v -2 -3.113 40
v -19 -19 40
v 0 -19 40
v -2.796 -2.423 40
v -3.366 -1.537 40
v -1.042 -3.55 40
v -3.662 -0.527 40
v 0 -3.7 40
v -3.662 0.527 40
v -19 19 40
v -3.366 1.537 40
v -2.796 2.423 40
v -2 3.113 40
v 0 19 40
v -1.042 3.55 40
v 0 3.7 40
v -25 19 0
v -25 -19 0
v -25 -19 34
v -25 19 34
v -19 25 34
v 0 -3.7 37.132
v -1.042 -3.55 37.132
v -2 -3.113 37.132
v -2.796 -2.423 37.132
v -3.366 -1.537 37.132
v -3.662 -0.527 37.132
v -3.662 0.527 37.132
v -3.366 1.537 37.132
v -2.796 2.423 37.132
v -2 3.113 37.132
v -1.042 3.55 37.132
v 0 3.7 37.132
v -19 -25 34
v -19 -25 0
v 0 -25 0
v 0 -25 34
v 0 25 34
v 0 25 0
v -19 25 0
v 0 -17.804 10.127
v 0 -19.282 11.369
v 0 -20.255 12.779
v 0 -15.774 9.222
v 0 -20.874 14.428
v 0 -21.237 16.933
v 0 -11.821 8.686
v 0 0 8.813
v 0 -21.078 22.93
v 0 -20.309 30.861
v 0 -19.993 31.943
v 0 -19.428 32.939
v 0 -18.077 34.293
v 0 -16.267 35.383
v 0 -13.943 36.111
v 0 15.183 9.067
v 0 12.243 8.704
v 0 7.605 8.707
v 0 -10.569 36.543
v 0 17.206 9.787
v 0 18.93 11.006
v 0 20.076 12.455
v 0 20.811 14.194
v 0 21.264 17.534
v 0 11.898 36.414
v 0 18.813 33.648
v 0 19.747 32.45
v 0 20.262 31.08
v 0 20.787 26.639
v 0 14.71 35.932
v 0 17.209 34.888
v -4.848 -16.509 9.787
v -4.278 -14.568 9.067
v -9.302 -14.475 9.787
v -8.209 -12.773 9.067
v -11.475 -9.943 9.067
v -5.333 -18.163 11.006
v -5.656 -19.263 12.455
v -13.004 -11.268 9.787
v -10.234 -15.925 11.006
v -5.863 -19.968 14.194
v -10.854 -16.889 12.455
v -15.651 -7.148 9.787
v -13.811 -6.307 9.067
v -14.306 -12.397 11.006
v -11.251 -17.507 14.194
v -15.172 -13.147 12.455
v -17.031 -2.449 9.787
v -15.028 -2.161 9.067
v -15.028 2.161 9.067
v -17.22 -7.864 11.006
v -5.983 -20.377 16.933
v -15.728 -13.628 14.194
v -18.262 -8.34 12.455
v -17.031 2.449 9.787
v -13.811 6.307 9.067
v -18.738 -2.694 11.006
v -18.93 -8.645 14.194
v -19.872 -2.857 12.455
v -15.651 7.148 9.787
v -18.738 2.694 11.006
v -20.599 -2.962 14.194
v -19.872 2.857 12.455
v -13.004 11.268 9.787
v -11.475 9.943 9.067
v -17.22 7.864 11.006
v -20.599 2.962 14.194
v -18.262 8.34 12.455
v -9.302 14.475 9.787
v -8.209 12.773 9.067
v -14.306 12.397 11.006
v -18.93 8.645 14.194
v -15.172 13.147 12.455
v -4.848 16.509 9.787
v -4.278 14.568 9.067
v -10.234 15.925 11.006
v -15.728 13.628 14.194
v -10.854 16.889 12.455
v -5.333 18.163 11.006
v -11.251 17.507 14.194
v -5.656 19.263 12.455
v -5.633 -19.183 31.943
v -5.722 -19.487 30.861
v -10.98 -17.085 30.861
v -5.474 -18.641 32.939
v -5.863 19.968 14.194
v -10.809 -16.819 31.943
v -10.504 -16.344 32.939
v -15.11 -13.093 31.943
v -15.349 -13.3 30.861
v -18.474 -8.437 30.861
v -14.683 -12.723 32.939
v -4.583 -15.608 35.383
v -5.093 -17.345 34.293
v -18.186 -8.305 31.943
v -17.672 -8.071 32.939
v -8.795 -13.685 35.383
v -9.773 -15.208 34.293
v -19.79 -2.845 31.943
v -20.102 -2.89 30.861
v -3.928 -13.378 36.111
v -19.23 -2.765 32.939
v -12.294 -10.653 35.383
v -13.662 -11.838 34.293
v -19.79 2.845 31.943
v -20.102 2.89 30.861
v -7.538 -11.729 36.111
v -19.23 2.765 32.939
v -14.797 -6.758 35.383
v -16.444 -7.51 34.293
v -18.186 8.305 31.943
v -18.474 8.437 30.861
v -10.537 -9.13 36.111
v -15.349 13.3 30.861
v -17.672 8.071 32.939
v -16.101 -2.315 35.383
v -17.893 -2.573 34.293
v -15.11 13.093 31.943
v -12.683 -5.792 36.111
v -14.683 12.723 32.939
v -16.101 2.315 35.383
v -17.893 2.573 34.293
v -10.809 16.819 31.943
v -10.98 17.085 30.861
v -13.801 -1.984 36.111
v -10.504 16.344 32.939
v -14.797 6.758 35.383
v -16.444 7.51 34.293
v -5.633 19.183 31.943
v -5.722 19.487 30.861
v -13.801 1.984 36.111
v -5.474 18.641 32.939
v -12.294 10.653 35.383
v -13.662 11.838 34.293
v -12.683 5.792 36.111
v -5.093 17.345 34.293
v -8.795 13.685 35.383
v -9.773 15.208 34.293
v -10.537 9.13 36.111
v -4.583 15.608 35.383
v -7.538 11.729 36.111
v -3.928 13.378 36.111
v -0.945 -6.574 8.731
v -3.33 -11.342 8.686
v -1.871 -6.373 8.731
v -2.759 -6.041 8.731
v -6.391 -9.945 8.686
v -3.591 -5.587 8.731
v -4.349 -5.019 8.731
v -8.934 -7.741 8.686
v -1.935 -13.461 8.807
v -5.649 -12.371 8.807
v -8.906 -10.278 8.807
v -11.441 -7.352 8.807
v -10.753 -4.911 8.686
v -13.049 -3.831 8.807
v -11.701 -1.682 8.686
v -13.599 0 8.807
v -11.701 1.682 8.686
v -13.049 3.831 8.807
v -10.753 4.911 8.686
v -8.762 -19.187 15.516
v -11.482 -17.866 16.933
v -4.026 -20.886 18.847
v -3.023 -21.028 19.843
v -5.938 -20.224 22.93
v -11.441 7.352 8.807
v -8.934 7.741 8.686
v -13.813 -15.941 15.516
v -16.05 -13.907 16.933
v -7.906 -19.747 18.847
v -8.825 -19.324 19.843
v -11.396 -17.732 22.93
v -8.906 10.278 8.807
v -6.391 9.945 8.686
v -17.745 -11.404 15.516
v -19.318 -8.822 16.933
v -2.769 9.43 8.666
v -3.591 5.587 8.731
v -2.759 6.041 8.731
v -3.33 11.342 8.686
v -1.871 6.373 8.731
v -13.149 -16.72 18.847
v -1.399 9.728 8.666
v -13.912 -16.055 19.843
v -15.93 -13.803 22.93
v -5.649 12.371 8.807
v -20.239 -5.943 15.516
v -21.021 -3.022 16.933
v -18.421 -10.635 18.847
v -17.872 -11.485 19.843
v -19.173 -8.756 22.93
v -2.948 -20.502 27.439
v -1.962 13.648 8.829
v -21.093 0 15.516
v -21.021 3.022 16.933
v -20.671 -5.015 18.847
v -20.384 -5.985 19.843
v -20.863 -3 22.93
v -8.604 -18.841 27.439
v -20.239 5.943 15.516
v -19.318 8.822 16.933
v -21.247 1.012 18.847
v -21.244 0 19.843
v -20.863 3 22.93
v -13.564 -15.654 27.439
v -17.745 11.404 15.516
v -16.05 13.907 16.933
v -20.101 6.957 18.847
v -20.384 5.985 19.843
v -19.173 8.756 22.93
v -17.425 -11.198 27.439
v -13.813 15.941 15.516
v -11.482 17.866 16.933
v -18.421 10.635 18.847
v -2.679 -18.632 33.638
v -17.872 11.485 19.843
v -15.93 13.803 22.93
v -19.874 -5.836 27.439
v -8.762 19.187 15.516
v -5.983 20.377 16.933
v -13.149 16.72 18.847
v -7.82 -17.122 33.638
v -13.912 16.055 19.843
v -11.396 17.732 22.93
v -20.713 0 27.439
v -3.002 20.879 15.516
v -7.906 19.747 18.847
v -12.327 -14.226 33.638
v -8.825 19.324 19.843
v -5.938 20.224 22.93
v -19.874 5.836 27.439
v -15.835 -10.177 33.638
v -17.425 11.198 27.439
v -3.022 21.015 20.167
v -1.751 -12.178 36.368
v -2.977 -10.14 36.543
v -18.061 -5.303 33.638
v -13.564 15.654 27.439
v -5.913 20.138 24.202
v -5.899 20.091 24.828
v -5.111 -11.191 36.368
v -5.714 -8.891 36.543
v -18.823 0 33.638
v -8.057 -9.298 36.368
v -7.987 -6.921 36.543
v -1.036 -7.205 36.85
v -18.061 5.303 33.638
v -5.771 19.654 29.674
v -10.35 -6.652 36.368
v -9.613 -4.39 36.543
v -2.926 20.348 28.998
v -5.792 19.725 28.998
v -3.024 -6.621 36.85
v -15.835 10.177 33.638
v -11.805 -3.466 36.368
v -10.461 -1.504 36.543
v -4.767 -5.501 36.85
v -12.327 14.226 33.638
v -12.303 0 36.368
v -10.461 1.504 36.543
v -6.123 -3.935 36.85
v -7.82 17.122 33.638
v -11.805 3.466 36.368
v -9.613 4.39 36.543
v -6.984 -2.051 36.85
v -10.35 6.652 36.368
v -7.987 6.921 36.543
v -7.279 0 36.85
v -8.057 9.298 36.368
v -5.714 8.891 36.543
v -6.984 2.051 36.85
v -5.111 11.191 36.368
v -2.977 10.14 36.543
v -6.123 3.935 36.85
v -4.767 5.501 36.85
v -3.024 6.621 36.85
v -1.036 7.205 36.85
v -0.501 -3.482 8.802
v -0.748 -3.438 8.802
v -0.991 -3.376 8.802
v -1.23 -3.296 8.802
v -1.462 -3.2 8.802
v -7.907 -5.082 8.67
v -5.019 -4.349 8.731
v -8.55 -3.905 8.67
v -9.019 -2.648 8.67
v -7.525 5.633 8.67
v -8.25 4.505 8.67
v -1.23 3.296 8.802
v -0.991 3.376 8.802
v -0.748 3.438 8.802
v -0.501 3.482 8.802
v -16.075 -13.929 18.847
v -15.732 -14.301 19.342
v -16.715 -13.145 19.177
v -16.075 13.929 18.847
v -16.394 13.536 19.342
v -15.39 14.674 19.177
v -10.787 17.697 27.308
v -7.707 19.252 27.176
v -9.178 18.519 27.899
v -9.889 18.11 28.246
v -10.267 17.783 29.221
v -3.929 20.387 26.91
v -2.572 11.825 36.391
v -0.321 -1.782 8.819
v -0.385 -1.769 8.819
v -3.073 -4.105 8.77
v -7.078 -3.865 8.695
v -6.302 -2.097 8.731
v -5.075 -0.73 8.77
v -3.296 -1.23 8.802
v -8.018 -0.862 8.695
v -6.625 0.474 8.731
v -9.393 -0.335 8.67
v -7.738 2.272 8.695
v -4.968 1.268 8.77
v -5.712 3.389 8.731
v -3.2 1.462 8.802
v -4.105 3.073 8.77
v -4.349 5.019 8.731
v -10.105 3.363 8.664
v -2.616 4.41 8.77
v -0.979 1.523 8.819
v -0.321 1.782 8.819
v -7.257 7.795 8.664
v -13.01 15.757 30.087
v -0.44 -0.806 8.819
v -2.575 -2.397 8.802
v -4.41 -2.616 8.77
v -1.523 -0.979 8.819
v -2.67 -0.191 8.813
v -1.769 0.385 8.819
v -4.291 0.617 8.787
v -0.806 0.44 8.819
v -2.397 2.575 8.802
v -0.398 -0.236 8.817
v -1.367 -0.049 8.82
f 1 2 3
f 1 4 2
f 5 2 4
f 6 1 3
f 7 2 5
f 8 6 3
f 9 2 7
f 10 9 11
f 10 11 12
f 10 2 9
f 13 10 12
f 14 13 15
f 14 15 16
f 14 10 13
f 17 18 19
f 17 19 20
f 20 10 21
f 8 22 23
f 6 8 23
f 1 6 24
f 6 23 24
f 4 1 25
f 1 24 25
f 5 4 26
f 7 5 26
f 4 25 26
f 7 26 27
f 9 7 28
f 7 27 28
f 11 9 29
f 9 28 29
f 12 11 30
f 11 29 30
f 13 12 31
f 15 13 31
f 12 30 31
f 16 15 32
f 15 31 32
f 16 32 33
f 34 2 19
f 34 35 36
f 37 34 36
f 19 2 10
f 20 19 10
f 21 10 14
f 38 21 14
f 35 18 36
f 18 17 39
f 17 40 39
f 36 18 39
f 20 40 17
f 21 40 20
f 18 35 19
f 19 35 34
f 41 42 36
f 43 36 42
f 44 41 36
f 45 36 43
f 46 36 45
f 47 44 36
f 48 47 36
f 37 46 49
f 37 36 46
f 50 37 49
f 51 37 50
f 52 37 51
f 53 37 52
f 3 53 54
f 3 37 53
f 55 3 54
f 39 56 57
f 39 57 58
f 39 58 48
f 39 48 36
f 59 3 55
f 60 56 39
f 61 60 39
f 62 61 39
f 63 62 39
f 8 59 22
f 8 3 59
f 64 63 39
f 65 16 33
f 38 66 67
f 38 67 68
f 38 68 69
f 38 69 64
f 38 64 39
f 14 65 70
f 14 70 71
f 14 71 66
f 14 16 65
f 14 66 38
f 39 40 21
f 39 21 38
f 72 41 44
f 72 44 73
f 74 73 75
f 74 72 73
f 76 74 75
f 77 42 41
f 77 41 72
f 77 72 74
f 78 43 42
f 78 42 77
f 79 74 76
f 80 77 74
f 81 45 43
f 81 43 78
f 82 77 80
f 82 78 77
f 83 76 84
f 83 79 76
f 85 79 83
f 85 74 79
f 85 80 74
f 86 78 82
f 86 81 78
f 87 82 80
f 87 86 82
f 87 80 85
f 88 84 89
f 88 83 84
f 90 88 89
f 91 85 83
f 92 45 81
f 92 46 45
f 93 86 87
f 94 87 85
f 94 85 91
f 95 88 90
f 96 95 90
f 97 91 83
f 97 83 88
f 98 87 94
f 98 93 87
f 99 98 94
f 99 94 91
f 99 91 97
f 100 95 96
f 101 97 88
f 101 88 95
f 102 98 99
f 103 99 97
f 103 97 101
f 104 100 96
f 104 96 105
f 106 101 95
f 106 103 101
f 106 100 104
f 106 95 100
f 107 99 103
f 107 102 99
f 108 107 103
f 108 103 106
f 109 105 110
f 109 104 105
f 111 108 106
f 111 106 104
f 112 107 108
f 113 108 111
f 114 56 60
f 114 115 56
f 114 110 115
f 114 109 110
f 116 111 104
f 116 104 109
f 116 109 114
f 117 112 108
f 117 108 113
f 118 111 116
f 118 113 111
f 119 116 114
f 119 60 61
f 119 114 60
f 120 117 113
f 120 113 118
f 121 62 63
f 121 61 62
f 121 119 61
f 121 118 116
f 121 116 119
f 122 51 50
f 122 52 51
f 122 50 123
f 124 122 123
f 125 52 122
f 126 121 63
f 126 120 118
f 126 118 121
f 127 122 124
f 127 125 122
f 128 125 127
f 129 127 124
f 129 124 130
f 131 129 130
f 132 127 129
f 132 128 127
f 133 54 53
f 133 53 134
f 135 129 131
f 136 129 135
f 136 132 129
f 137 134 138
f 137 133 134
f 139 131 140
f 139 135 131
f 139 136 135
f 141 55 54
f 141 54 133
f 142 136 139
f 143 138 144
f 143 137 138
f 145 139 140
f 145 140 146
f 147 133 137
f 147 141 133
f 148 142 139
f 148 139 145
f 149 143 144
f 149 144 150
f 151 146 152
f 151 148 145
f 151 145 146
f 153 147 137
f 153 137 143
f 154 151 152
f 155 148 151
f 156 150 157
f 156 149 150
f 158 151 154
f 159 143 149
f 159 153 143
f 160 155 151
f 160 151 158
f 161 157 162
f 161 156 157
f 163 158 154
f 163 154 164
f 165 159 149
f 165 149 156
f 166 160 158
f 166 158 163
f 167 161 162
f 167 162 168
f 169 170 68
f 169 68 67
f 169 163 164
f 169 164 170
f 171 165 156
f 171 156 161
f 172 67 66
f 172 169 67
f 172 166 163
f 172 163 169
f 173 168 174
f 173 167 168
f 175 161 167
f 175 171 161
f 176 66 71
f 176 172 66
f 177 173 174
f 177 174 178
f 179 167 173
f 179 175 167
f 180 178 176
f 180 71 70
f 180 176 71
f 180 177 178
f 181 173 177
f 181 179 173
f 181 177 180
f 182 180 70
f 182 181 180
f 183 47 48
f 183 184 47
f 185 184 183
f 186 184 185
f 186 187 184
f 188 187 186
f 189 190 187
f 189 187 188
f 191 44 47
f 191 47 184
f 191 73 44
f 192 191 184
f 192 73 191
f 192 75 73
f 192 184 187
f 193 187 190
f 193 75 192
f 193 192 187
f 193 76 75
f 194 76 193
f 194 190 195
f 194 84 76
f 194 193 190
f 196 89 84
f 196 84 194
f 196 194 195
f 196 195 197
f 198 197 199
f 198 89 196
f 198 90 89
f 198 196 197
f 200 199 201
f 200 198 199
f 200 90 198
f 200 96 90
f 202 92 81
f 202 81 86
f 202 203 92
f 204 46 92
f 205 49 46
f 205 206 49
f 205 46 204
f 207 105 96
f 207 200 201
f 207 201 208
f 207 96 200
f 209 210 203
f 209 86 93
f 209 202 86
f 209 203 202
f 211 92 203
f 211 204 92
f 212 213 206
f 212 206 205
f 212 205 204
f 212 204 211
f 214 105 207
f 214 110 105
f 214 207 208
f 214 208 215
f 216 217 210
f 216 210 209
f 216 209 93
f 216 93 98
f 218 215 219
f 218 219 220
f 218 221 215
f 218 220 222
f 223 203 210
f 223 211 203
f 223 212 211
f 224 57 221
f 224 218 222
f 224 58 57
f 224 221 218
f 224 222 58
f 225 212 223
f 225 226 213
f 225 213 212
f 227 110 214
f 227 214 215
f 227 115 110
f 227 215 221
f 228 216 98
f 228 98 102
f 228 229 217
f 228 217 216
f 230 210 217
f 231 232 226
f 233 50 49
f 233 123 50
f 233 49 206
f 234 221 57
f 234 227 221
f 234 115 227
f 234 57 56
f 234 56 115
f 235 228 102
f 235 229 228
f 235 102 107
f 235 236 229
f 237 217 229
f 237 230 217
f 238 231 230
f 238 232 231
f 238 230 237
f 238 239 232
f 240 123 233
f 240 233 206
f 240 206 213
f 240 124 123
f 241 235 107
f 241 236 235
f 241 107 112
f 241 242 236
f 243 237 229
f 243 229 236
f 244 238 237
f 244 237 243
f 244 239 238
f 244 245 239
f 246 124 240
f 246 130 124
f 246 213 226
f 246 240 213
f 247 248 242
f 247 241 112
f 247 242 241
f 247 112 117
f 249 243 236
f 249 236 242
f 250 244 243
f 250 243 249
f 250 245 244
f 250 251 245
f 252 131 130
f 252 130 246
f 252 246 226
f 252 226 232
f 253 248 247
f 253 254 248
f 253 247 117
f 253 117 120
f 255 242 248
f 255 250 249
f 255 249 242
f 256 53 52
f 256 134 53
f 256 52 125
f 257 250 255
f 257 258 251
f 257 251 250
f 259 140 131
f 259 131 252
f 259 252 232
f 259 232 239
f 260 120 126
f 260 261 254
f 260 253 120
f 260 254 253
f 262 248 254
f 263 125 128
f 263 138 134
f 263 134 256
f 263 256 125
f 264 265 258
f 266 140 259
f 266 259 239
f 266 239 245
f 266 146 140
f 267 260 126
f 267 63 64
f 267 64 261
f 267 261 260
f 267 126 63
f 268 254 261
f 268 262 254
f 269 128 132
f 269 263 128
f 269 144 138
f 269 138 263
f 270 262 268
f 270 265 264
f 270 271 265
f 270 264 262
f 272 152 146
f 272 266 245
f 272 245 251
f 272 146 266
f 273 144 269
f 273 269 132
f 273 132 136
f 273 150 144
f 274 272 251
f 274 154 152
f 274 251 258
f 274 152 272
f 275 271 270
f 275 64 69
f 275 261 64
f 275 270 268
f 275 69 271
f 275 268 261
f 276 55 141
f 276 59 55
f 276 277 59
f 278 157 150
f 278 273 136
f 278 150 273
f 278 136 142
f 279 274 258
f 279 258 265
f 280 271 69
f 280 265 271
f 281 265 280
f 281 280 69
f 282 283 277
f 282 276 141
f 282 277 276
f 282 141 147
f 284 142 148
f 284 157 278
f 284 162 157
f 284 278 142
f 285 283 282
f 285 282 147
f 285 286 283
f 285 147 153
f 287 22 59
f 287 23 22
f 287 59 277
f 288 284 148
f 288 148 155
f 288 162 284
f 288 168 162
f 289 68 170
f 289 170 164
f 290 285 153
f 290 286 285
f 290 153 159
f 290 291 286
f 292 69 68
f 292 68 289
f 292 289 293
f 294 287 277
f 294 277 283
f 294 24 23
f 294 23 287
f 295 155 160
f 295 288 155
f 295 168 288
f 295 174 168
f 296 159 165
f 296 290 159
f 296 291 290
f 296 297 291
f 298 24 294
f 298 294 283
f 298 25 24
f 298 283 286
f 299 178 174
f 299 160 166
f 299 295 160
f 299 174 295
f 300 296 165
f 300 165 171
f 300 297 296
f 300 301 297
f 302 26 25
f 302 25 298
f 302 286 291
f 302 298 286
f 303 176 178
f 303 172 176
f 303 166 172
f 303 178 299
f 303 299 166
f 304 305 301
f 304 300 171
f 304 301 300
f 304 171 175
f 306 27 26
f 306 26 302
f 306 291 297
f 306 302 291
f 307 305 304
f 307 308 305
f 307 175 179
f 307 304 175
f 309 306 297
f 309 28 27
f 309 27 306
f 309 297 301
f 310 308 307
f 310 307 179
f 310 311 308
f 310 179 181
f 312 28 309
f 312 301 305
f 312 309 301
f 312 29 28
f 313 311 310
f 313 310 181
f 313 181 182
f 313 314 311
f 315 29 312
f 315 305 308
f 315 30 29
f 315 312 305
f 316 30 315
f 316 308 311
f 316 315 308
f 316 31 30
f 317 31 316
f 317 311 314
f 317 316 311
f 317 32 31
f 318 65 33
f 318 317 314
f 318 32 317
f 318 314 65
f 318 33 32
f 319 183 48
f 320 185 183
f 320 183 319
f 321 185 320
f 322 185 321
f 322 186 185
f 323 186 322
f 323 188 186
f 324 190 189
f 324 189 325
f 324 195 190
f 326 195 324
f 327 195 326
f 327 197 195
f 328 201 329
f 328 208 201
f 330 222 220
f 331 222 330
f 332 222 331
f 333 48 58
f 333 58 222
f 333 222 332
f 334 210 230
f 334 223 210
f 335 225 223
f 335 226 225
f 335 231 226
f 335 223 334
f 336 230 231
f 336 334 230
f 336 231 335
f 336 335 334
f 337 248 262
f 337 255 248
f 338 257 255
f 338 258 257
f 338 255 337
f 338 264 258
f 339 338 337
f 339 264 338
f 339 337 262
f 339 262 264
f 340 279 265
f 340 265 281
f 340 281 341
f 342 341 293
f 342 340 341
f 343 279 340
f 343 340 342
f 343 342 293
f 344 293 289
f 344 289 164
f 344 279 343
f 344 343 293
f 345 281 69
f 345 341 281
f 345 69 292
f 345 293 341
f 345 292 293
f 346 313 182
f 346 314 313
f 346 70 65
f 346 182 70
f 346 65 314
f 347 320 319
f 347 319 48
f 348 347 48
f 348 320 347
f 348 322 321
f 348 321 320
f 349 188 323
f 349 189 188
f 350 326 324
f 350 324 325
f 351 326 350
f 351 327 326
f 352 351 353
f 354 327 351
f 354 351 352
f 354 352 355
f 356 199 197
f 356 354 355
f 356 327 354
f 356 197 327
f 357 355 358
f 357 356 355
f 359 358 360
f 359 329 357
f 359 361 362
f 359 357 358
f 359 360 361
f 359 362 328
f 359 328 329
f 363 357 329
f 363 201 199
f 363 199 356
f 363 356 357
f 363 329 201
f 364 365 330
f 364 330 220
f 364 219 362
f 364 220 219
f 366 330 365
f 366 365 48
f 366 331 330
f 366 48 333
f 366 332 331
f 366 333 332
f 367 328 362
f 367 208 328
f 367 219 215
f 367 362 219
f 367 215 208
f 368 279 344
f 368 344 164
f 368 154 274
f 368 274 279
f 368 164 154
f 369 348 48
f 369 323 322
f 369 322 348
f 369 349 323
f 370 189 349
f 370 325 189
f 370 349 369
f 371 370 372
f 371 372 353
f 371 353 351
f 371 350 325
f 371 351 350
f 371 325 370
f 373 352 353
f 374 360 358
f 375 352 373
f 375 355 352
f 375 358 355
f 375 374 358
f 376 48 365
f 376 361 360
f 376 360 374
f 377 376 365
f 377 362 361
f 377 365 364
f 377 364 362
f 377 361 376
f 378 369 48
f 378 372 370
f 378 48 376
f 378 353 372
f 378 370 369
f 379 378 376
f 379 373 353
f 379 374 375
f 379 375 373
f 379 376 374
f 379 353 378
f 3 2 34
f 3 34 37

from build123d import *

# Parameters (mm, degrees)
F0_W     = 50
F0_H     = 50
F1_DEPTH = 40
F2_SIZE  = 6
F3_W     = 83.7730430067
F3_H     = 50.7384873927
F4_DEPTH = 25


with BuildPart() as f1:
    # F0 (on Top) → F1 (new body)
    with BuildSketch(Plane.XY):
        Rectangle(F0_W, F0_H)
    extrude(amount=F1_DEPTH)

    # F2
    f2_edges = [f1.edges().sort_by_distance(p)[0] for p in [
        (0, -25, 40),
        (25, 0, 40),
        (0, 25, 40),
        (-25, 0, 40),
        (25, -25, 20),
        (25, 25, 20),
        (-25, -25, 20),
        (-25, 25, 20),
    ]]
    chamfer(f2_edges, length=F2_SIZE)

    # F3 (on Right) → F4 (cut)
    with BuildSketch(Plane.YZ):
        with Locations((1.3156887144, 25.3692436963)):
            Rectangle(F3_W, F3_H)
    extrude(amount=F4_DEPTH, mode=Mode.SUBTRACT)

    # F5 (on face) → F6 (revolve, cut)
    with BuildSketch(Plane.YZ):
        with BuildLine():
            add(Edge.make_bspline(
                [(0, 8.81283544), (-7.6750135049, 8.8968714699), (-15.6428759777, 7.7376163766), (-21.3710906151, 12.9309668683), (-21.3286430979, 20.6974018657), (-20.5851575354, 29.1049836415), (-20.0912714693, 32.8565548223), (-15.8713216928, 36.1712388493), (-10.2699402926, 36.5207207773), (-5.8143442687, 37.0119311275), (-3.7, 37.1318450321)],
                knots=[0, 0, 0, 0, 0.1841228893, 0.2950075682, 0.4215719078, 0.5555240151, 0.642229878, 0.7414659734, 0.8575719069, 0.9488735314, 0.9488735314, 0.9488735314, 0.9488735314], degree=3))
            Line((0, 8.81283544), (0, 37.2170992196))
            add(Edge.make_bspline(
                [(-3.7, 37.1318450321), (-2.5160237402, 37.1989936126), (-1.2840796224, 37.235939493), (0, 37.2170992196)],
                knots=[0.9488735314, 0.9488735314, 0.9488735314, 0.9488735314, 1, 1, 1, 1], degree=3))
        make_face()
        with BuildLine():
            Line((-3.7, 40), (-3.7, 37.1318450321))
            add(Edge.make_bspline(
                [(-3.7, 37.1318450321), (-2.5160237402, 37.1989936126), (-1.2840796224, 37.235939493), (0, 37.2170992196)],
                knots=[0.9488735314, 0.9488735314, 0.9488735314, 0.9488735314, 1, 1, 1, 1], degree=3))
            Line((0, 37.2170992196), (0, 40))
            Line((0, 40), (-3.7, 40))
        make_face()
    revolve(axis=Axis((0, 0, 24.40641772), (0, 0, -1)), mode=Mode.SUBTRACT)


solid = f1.part
